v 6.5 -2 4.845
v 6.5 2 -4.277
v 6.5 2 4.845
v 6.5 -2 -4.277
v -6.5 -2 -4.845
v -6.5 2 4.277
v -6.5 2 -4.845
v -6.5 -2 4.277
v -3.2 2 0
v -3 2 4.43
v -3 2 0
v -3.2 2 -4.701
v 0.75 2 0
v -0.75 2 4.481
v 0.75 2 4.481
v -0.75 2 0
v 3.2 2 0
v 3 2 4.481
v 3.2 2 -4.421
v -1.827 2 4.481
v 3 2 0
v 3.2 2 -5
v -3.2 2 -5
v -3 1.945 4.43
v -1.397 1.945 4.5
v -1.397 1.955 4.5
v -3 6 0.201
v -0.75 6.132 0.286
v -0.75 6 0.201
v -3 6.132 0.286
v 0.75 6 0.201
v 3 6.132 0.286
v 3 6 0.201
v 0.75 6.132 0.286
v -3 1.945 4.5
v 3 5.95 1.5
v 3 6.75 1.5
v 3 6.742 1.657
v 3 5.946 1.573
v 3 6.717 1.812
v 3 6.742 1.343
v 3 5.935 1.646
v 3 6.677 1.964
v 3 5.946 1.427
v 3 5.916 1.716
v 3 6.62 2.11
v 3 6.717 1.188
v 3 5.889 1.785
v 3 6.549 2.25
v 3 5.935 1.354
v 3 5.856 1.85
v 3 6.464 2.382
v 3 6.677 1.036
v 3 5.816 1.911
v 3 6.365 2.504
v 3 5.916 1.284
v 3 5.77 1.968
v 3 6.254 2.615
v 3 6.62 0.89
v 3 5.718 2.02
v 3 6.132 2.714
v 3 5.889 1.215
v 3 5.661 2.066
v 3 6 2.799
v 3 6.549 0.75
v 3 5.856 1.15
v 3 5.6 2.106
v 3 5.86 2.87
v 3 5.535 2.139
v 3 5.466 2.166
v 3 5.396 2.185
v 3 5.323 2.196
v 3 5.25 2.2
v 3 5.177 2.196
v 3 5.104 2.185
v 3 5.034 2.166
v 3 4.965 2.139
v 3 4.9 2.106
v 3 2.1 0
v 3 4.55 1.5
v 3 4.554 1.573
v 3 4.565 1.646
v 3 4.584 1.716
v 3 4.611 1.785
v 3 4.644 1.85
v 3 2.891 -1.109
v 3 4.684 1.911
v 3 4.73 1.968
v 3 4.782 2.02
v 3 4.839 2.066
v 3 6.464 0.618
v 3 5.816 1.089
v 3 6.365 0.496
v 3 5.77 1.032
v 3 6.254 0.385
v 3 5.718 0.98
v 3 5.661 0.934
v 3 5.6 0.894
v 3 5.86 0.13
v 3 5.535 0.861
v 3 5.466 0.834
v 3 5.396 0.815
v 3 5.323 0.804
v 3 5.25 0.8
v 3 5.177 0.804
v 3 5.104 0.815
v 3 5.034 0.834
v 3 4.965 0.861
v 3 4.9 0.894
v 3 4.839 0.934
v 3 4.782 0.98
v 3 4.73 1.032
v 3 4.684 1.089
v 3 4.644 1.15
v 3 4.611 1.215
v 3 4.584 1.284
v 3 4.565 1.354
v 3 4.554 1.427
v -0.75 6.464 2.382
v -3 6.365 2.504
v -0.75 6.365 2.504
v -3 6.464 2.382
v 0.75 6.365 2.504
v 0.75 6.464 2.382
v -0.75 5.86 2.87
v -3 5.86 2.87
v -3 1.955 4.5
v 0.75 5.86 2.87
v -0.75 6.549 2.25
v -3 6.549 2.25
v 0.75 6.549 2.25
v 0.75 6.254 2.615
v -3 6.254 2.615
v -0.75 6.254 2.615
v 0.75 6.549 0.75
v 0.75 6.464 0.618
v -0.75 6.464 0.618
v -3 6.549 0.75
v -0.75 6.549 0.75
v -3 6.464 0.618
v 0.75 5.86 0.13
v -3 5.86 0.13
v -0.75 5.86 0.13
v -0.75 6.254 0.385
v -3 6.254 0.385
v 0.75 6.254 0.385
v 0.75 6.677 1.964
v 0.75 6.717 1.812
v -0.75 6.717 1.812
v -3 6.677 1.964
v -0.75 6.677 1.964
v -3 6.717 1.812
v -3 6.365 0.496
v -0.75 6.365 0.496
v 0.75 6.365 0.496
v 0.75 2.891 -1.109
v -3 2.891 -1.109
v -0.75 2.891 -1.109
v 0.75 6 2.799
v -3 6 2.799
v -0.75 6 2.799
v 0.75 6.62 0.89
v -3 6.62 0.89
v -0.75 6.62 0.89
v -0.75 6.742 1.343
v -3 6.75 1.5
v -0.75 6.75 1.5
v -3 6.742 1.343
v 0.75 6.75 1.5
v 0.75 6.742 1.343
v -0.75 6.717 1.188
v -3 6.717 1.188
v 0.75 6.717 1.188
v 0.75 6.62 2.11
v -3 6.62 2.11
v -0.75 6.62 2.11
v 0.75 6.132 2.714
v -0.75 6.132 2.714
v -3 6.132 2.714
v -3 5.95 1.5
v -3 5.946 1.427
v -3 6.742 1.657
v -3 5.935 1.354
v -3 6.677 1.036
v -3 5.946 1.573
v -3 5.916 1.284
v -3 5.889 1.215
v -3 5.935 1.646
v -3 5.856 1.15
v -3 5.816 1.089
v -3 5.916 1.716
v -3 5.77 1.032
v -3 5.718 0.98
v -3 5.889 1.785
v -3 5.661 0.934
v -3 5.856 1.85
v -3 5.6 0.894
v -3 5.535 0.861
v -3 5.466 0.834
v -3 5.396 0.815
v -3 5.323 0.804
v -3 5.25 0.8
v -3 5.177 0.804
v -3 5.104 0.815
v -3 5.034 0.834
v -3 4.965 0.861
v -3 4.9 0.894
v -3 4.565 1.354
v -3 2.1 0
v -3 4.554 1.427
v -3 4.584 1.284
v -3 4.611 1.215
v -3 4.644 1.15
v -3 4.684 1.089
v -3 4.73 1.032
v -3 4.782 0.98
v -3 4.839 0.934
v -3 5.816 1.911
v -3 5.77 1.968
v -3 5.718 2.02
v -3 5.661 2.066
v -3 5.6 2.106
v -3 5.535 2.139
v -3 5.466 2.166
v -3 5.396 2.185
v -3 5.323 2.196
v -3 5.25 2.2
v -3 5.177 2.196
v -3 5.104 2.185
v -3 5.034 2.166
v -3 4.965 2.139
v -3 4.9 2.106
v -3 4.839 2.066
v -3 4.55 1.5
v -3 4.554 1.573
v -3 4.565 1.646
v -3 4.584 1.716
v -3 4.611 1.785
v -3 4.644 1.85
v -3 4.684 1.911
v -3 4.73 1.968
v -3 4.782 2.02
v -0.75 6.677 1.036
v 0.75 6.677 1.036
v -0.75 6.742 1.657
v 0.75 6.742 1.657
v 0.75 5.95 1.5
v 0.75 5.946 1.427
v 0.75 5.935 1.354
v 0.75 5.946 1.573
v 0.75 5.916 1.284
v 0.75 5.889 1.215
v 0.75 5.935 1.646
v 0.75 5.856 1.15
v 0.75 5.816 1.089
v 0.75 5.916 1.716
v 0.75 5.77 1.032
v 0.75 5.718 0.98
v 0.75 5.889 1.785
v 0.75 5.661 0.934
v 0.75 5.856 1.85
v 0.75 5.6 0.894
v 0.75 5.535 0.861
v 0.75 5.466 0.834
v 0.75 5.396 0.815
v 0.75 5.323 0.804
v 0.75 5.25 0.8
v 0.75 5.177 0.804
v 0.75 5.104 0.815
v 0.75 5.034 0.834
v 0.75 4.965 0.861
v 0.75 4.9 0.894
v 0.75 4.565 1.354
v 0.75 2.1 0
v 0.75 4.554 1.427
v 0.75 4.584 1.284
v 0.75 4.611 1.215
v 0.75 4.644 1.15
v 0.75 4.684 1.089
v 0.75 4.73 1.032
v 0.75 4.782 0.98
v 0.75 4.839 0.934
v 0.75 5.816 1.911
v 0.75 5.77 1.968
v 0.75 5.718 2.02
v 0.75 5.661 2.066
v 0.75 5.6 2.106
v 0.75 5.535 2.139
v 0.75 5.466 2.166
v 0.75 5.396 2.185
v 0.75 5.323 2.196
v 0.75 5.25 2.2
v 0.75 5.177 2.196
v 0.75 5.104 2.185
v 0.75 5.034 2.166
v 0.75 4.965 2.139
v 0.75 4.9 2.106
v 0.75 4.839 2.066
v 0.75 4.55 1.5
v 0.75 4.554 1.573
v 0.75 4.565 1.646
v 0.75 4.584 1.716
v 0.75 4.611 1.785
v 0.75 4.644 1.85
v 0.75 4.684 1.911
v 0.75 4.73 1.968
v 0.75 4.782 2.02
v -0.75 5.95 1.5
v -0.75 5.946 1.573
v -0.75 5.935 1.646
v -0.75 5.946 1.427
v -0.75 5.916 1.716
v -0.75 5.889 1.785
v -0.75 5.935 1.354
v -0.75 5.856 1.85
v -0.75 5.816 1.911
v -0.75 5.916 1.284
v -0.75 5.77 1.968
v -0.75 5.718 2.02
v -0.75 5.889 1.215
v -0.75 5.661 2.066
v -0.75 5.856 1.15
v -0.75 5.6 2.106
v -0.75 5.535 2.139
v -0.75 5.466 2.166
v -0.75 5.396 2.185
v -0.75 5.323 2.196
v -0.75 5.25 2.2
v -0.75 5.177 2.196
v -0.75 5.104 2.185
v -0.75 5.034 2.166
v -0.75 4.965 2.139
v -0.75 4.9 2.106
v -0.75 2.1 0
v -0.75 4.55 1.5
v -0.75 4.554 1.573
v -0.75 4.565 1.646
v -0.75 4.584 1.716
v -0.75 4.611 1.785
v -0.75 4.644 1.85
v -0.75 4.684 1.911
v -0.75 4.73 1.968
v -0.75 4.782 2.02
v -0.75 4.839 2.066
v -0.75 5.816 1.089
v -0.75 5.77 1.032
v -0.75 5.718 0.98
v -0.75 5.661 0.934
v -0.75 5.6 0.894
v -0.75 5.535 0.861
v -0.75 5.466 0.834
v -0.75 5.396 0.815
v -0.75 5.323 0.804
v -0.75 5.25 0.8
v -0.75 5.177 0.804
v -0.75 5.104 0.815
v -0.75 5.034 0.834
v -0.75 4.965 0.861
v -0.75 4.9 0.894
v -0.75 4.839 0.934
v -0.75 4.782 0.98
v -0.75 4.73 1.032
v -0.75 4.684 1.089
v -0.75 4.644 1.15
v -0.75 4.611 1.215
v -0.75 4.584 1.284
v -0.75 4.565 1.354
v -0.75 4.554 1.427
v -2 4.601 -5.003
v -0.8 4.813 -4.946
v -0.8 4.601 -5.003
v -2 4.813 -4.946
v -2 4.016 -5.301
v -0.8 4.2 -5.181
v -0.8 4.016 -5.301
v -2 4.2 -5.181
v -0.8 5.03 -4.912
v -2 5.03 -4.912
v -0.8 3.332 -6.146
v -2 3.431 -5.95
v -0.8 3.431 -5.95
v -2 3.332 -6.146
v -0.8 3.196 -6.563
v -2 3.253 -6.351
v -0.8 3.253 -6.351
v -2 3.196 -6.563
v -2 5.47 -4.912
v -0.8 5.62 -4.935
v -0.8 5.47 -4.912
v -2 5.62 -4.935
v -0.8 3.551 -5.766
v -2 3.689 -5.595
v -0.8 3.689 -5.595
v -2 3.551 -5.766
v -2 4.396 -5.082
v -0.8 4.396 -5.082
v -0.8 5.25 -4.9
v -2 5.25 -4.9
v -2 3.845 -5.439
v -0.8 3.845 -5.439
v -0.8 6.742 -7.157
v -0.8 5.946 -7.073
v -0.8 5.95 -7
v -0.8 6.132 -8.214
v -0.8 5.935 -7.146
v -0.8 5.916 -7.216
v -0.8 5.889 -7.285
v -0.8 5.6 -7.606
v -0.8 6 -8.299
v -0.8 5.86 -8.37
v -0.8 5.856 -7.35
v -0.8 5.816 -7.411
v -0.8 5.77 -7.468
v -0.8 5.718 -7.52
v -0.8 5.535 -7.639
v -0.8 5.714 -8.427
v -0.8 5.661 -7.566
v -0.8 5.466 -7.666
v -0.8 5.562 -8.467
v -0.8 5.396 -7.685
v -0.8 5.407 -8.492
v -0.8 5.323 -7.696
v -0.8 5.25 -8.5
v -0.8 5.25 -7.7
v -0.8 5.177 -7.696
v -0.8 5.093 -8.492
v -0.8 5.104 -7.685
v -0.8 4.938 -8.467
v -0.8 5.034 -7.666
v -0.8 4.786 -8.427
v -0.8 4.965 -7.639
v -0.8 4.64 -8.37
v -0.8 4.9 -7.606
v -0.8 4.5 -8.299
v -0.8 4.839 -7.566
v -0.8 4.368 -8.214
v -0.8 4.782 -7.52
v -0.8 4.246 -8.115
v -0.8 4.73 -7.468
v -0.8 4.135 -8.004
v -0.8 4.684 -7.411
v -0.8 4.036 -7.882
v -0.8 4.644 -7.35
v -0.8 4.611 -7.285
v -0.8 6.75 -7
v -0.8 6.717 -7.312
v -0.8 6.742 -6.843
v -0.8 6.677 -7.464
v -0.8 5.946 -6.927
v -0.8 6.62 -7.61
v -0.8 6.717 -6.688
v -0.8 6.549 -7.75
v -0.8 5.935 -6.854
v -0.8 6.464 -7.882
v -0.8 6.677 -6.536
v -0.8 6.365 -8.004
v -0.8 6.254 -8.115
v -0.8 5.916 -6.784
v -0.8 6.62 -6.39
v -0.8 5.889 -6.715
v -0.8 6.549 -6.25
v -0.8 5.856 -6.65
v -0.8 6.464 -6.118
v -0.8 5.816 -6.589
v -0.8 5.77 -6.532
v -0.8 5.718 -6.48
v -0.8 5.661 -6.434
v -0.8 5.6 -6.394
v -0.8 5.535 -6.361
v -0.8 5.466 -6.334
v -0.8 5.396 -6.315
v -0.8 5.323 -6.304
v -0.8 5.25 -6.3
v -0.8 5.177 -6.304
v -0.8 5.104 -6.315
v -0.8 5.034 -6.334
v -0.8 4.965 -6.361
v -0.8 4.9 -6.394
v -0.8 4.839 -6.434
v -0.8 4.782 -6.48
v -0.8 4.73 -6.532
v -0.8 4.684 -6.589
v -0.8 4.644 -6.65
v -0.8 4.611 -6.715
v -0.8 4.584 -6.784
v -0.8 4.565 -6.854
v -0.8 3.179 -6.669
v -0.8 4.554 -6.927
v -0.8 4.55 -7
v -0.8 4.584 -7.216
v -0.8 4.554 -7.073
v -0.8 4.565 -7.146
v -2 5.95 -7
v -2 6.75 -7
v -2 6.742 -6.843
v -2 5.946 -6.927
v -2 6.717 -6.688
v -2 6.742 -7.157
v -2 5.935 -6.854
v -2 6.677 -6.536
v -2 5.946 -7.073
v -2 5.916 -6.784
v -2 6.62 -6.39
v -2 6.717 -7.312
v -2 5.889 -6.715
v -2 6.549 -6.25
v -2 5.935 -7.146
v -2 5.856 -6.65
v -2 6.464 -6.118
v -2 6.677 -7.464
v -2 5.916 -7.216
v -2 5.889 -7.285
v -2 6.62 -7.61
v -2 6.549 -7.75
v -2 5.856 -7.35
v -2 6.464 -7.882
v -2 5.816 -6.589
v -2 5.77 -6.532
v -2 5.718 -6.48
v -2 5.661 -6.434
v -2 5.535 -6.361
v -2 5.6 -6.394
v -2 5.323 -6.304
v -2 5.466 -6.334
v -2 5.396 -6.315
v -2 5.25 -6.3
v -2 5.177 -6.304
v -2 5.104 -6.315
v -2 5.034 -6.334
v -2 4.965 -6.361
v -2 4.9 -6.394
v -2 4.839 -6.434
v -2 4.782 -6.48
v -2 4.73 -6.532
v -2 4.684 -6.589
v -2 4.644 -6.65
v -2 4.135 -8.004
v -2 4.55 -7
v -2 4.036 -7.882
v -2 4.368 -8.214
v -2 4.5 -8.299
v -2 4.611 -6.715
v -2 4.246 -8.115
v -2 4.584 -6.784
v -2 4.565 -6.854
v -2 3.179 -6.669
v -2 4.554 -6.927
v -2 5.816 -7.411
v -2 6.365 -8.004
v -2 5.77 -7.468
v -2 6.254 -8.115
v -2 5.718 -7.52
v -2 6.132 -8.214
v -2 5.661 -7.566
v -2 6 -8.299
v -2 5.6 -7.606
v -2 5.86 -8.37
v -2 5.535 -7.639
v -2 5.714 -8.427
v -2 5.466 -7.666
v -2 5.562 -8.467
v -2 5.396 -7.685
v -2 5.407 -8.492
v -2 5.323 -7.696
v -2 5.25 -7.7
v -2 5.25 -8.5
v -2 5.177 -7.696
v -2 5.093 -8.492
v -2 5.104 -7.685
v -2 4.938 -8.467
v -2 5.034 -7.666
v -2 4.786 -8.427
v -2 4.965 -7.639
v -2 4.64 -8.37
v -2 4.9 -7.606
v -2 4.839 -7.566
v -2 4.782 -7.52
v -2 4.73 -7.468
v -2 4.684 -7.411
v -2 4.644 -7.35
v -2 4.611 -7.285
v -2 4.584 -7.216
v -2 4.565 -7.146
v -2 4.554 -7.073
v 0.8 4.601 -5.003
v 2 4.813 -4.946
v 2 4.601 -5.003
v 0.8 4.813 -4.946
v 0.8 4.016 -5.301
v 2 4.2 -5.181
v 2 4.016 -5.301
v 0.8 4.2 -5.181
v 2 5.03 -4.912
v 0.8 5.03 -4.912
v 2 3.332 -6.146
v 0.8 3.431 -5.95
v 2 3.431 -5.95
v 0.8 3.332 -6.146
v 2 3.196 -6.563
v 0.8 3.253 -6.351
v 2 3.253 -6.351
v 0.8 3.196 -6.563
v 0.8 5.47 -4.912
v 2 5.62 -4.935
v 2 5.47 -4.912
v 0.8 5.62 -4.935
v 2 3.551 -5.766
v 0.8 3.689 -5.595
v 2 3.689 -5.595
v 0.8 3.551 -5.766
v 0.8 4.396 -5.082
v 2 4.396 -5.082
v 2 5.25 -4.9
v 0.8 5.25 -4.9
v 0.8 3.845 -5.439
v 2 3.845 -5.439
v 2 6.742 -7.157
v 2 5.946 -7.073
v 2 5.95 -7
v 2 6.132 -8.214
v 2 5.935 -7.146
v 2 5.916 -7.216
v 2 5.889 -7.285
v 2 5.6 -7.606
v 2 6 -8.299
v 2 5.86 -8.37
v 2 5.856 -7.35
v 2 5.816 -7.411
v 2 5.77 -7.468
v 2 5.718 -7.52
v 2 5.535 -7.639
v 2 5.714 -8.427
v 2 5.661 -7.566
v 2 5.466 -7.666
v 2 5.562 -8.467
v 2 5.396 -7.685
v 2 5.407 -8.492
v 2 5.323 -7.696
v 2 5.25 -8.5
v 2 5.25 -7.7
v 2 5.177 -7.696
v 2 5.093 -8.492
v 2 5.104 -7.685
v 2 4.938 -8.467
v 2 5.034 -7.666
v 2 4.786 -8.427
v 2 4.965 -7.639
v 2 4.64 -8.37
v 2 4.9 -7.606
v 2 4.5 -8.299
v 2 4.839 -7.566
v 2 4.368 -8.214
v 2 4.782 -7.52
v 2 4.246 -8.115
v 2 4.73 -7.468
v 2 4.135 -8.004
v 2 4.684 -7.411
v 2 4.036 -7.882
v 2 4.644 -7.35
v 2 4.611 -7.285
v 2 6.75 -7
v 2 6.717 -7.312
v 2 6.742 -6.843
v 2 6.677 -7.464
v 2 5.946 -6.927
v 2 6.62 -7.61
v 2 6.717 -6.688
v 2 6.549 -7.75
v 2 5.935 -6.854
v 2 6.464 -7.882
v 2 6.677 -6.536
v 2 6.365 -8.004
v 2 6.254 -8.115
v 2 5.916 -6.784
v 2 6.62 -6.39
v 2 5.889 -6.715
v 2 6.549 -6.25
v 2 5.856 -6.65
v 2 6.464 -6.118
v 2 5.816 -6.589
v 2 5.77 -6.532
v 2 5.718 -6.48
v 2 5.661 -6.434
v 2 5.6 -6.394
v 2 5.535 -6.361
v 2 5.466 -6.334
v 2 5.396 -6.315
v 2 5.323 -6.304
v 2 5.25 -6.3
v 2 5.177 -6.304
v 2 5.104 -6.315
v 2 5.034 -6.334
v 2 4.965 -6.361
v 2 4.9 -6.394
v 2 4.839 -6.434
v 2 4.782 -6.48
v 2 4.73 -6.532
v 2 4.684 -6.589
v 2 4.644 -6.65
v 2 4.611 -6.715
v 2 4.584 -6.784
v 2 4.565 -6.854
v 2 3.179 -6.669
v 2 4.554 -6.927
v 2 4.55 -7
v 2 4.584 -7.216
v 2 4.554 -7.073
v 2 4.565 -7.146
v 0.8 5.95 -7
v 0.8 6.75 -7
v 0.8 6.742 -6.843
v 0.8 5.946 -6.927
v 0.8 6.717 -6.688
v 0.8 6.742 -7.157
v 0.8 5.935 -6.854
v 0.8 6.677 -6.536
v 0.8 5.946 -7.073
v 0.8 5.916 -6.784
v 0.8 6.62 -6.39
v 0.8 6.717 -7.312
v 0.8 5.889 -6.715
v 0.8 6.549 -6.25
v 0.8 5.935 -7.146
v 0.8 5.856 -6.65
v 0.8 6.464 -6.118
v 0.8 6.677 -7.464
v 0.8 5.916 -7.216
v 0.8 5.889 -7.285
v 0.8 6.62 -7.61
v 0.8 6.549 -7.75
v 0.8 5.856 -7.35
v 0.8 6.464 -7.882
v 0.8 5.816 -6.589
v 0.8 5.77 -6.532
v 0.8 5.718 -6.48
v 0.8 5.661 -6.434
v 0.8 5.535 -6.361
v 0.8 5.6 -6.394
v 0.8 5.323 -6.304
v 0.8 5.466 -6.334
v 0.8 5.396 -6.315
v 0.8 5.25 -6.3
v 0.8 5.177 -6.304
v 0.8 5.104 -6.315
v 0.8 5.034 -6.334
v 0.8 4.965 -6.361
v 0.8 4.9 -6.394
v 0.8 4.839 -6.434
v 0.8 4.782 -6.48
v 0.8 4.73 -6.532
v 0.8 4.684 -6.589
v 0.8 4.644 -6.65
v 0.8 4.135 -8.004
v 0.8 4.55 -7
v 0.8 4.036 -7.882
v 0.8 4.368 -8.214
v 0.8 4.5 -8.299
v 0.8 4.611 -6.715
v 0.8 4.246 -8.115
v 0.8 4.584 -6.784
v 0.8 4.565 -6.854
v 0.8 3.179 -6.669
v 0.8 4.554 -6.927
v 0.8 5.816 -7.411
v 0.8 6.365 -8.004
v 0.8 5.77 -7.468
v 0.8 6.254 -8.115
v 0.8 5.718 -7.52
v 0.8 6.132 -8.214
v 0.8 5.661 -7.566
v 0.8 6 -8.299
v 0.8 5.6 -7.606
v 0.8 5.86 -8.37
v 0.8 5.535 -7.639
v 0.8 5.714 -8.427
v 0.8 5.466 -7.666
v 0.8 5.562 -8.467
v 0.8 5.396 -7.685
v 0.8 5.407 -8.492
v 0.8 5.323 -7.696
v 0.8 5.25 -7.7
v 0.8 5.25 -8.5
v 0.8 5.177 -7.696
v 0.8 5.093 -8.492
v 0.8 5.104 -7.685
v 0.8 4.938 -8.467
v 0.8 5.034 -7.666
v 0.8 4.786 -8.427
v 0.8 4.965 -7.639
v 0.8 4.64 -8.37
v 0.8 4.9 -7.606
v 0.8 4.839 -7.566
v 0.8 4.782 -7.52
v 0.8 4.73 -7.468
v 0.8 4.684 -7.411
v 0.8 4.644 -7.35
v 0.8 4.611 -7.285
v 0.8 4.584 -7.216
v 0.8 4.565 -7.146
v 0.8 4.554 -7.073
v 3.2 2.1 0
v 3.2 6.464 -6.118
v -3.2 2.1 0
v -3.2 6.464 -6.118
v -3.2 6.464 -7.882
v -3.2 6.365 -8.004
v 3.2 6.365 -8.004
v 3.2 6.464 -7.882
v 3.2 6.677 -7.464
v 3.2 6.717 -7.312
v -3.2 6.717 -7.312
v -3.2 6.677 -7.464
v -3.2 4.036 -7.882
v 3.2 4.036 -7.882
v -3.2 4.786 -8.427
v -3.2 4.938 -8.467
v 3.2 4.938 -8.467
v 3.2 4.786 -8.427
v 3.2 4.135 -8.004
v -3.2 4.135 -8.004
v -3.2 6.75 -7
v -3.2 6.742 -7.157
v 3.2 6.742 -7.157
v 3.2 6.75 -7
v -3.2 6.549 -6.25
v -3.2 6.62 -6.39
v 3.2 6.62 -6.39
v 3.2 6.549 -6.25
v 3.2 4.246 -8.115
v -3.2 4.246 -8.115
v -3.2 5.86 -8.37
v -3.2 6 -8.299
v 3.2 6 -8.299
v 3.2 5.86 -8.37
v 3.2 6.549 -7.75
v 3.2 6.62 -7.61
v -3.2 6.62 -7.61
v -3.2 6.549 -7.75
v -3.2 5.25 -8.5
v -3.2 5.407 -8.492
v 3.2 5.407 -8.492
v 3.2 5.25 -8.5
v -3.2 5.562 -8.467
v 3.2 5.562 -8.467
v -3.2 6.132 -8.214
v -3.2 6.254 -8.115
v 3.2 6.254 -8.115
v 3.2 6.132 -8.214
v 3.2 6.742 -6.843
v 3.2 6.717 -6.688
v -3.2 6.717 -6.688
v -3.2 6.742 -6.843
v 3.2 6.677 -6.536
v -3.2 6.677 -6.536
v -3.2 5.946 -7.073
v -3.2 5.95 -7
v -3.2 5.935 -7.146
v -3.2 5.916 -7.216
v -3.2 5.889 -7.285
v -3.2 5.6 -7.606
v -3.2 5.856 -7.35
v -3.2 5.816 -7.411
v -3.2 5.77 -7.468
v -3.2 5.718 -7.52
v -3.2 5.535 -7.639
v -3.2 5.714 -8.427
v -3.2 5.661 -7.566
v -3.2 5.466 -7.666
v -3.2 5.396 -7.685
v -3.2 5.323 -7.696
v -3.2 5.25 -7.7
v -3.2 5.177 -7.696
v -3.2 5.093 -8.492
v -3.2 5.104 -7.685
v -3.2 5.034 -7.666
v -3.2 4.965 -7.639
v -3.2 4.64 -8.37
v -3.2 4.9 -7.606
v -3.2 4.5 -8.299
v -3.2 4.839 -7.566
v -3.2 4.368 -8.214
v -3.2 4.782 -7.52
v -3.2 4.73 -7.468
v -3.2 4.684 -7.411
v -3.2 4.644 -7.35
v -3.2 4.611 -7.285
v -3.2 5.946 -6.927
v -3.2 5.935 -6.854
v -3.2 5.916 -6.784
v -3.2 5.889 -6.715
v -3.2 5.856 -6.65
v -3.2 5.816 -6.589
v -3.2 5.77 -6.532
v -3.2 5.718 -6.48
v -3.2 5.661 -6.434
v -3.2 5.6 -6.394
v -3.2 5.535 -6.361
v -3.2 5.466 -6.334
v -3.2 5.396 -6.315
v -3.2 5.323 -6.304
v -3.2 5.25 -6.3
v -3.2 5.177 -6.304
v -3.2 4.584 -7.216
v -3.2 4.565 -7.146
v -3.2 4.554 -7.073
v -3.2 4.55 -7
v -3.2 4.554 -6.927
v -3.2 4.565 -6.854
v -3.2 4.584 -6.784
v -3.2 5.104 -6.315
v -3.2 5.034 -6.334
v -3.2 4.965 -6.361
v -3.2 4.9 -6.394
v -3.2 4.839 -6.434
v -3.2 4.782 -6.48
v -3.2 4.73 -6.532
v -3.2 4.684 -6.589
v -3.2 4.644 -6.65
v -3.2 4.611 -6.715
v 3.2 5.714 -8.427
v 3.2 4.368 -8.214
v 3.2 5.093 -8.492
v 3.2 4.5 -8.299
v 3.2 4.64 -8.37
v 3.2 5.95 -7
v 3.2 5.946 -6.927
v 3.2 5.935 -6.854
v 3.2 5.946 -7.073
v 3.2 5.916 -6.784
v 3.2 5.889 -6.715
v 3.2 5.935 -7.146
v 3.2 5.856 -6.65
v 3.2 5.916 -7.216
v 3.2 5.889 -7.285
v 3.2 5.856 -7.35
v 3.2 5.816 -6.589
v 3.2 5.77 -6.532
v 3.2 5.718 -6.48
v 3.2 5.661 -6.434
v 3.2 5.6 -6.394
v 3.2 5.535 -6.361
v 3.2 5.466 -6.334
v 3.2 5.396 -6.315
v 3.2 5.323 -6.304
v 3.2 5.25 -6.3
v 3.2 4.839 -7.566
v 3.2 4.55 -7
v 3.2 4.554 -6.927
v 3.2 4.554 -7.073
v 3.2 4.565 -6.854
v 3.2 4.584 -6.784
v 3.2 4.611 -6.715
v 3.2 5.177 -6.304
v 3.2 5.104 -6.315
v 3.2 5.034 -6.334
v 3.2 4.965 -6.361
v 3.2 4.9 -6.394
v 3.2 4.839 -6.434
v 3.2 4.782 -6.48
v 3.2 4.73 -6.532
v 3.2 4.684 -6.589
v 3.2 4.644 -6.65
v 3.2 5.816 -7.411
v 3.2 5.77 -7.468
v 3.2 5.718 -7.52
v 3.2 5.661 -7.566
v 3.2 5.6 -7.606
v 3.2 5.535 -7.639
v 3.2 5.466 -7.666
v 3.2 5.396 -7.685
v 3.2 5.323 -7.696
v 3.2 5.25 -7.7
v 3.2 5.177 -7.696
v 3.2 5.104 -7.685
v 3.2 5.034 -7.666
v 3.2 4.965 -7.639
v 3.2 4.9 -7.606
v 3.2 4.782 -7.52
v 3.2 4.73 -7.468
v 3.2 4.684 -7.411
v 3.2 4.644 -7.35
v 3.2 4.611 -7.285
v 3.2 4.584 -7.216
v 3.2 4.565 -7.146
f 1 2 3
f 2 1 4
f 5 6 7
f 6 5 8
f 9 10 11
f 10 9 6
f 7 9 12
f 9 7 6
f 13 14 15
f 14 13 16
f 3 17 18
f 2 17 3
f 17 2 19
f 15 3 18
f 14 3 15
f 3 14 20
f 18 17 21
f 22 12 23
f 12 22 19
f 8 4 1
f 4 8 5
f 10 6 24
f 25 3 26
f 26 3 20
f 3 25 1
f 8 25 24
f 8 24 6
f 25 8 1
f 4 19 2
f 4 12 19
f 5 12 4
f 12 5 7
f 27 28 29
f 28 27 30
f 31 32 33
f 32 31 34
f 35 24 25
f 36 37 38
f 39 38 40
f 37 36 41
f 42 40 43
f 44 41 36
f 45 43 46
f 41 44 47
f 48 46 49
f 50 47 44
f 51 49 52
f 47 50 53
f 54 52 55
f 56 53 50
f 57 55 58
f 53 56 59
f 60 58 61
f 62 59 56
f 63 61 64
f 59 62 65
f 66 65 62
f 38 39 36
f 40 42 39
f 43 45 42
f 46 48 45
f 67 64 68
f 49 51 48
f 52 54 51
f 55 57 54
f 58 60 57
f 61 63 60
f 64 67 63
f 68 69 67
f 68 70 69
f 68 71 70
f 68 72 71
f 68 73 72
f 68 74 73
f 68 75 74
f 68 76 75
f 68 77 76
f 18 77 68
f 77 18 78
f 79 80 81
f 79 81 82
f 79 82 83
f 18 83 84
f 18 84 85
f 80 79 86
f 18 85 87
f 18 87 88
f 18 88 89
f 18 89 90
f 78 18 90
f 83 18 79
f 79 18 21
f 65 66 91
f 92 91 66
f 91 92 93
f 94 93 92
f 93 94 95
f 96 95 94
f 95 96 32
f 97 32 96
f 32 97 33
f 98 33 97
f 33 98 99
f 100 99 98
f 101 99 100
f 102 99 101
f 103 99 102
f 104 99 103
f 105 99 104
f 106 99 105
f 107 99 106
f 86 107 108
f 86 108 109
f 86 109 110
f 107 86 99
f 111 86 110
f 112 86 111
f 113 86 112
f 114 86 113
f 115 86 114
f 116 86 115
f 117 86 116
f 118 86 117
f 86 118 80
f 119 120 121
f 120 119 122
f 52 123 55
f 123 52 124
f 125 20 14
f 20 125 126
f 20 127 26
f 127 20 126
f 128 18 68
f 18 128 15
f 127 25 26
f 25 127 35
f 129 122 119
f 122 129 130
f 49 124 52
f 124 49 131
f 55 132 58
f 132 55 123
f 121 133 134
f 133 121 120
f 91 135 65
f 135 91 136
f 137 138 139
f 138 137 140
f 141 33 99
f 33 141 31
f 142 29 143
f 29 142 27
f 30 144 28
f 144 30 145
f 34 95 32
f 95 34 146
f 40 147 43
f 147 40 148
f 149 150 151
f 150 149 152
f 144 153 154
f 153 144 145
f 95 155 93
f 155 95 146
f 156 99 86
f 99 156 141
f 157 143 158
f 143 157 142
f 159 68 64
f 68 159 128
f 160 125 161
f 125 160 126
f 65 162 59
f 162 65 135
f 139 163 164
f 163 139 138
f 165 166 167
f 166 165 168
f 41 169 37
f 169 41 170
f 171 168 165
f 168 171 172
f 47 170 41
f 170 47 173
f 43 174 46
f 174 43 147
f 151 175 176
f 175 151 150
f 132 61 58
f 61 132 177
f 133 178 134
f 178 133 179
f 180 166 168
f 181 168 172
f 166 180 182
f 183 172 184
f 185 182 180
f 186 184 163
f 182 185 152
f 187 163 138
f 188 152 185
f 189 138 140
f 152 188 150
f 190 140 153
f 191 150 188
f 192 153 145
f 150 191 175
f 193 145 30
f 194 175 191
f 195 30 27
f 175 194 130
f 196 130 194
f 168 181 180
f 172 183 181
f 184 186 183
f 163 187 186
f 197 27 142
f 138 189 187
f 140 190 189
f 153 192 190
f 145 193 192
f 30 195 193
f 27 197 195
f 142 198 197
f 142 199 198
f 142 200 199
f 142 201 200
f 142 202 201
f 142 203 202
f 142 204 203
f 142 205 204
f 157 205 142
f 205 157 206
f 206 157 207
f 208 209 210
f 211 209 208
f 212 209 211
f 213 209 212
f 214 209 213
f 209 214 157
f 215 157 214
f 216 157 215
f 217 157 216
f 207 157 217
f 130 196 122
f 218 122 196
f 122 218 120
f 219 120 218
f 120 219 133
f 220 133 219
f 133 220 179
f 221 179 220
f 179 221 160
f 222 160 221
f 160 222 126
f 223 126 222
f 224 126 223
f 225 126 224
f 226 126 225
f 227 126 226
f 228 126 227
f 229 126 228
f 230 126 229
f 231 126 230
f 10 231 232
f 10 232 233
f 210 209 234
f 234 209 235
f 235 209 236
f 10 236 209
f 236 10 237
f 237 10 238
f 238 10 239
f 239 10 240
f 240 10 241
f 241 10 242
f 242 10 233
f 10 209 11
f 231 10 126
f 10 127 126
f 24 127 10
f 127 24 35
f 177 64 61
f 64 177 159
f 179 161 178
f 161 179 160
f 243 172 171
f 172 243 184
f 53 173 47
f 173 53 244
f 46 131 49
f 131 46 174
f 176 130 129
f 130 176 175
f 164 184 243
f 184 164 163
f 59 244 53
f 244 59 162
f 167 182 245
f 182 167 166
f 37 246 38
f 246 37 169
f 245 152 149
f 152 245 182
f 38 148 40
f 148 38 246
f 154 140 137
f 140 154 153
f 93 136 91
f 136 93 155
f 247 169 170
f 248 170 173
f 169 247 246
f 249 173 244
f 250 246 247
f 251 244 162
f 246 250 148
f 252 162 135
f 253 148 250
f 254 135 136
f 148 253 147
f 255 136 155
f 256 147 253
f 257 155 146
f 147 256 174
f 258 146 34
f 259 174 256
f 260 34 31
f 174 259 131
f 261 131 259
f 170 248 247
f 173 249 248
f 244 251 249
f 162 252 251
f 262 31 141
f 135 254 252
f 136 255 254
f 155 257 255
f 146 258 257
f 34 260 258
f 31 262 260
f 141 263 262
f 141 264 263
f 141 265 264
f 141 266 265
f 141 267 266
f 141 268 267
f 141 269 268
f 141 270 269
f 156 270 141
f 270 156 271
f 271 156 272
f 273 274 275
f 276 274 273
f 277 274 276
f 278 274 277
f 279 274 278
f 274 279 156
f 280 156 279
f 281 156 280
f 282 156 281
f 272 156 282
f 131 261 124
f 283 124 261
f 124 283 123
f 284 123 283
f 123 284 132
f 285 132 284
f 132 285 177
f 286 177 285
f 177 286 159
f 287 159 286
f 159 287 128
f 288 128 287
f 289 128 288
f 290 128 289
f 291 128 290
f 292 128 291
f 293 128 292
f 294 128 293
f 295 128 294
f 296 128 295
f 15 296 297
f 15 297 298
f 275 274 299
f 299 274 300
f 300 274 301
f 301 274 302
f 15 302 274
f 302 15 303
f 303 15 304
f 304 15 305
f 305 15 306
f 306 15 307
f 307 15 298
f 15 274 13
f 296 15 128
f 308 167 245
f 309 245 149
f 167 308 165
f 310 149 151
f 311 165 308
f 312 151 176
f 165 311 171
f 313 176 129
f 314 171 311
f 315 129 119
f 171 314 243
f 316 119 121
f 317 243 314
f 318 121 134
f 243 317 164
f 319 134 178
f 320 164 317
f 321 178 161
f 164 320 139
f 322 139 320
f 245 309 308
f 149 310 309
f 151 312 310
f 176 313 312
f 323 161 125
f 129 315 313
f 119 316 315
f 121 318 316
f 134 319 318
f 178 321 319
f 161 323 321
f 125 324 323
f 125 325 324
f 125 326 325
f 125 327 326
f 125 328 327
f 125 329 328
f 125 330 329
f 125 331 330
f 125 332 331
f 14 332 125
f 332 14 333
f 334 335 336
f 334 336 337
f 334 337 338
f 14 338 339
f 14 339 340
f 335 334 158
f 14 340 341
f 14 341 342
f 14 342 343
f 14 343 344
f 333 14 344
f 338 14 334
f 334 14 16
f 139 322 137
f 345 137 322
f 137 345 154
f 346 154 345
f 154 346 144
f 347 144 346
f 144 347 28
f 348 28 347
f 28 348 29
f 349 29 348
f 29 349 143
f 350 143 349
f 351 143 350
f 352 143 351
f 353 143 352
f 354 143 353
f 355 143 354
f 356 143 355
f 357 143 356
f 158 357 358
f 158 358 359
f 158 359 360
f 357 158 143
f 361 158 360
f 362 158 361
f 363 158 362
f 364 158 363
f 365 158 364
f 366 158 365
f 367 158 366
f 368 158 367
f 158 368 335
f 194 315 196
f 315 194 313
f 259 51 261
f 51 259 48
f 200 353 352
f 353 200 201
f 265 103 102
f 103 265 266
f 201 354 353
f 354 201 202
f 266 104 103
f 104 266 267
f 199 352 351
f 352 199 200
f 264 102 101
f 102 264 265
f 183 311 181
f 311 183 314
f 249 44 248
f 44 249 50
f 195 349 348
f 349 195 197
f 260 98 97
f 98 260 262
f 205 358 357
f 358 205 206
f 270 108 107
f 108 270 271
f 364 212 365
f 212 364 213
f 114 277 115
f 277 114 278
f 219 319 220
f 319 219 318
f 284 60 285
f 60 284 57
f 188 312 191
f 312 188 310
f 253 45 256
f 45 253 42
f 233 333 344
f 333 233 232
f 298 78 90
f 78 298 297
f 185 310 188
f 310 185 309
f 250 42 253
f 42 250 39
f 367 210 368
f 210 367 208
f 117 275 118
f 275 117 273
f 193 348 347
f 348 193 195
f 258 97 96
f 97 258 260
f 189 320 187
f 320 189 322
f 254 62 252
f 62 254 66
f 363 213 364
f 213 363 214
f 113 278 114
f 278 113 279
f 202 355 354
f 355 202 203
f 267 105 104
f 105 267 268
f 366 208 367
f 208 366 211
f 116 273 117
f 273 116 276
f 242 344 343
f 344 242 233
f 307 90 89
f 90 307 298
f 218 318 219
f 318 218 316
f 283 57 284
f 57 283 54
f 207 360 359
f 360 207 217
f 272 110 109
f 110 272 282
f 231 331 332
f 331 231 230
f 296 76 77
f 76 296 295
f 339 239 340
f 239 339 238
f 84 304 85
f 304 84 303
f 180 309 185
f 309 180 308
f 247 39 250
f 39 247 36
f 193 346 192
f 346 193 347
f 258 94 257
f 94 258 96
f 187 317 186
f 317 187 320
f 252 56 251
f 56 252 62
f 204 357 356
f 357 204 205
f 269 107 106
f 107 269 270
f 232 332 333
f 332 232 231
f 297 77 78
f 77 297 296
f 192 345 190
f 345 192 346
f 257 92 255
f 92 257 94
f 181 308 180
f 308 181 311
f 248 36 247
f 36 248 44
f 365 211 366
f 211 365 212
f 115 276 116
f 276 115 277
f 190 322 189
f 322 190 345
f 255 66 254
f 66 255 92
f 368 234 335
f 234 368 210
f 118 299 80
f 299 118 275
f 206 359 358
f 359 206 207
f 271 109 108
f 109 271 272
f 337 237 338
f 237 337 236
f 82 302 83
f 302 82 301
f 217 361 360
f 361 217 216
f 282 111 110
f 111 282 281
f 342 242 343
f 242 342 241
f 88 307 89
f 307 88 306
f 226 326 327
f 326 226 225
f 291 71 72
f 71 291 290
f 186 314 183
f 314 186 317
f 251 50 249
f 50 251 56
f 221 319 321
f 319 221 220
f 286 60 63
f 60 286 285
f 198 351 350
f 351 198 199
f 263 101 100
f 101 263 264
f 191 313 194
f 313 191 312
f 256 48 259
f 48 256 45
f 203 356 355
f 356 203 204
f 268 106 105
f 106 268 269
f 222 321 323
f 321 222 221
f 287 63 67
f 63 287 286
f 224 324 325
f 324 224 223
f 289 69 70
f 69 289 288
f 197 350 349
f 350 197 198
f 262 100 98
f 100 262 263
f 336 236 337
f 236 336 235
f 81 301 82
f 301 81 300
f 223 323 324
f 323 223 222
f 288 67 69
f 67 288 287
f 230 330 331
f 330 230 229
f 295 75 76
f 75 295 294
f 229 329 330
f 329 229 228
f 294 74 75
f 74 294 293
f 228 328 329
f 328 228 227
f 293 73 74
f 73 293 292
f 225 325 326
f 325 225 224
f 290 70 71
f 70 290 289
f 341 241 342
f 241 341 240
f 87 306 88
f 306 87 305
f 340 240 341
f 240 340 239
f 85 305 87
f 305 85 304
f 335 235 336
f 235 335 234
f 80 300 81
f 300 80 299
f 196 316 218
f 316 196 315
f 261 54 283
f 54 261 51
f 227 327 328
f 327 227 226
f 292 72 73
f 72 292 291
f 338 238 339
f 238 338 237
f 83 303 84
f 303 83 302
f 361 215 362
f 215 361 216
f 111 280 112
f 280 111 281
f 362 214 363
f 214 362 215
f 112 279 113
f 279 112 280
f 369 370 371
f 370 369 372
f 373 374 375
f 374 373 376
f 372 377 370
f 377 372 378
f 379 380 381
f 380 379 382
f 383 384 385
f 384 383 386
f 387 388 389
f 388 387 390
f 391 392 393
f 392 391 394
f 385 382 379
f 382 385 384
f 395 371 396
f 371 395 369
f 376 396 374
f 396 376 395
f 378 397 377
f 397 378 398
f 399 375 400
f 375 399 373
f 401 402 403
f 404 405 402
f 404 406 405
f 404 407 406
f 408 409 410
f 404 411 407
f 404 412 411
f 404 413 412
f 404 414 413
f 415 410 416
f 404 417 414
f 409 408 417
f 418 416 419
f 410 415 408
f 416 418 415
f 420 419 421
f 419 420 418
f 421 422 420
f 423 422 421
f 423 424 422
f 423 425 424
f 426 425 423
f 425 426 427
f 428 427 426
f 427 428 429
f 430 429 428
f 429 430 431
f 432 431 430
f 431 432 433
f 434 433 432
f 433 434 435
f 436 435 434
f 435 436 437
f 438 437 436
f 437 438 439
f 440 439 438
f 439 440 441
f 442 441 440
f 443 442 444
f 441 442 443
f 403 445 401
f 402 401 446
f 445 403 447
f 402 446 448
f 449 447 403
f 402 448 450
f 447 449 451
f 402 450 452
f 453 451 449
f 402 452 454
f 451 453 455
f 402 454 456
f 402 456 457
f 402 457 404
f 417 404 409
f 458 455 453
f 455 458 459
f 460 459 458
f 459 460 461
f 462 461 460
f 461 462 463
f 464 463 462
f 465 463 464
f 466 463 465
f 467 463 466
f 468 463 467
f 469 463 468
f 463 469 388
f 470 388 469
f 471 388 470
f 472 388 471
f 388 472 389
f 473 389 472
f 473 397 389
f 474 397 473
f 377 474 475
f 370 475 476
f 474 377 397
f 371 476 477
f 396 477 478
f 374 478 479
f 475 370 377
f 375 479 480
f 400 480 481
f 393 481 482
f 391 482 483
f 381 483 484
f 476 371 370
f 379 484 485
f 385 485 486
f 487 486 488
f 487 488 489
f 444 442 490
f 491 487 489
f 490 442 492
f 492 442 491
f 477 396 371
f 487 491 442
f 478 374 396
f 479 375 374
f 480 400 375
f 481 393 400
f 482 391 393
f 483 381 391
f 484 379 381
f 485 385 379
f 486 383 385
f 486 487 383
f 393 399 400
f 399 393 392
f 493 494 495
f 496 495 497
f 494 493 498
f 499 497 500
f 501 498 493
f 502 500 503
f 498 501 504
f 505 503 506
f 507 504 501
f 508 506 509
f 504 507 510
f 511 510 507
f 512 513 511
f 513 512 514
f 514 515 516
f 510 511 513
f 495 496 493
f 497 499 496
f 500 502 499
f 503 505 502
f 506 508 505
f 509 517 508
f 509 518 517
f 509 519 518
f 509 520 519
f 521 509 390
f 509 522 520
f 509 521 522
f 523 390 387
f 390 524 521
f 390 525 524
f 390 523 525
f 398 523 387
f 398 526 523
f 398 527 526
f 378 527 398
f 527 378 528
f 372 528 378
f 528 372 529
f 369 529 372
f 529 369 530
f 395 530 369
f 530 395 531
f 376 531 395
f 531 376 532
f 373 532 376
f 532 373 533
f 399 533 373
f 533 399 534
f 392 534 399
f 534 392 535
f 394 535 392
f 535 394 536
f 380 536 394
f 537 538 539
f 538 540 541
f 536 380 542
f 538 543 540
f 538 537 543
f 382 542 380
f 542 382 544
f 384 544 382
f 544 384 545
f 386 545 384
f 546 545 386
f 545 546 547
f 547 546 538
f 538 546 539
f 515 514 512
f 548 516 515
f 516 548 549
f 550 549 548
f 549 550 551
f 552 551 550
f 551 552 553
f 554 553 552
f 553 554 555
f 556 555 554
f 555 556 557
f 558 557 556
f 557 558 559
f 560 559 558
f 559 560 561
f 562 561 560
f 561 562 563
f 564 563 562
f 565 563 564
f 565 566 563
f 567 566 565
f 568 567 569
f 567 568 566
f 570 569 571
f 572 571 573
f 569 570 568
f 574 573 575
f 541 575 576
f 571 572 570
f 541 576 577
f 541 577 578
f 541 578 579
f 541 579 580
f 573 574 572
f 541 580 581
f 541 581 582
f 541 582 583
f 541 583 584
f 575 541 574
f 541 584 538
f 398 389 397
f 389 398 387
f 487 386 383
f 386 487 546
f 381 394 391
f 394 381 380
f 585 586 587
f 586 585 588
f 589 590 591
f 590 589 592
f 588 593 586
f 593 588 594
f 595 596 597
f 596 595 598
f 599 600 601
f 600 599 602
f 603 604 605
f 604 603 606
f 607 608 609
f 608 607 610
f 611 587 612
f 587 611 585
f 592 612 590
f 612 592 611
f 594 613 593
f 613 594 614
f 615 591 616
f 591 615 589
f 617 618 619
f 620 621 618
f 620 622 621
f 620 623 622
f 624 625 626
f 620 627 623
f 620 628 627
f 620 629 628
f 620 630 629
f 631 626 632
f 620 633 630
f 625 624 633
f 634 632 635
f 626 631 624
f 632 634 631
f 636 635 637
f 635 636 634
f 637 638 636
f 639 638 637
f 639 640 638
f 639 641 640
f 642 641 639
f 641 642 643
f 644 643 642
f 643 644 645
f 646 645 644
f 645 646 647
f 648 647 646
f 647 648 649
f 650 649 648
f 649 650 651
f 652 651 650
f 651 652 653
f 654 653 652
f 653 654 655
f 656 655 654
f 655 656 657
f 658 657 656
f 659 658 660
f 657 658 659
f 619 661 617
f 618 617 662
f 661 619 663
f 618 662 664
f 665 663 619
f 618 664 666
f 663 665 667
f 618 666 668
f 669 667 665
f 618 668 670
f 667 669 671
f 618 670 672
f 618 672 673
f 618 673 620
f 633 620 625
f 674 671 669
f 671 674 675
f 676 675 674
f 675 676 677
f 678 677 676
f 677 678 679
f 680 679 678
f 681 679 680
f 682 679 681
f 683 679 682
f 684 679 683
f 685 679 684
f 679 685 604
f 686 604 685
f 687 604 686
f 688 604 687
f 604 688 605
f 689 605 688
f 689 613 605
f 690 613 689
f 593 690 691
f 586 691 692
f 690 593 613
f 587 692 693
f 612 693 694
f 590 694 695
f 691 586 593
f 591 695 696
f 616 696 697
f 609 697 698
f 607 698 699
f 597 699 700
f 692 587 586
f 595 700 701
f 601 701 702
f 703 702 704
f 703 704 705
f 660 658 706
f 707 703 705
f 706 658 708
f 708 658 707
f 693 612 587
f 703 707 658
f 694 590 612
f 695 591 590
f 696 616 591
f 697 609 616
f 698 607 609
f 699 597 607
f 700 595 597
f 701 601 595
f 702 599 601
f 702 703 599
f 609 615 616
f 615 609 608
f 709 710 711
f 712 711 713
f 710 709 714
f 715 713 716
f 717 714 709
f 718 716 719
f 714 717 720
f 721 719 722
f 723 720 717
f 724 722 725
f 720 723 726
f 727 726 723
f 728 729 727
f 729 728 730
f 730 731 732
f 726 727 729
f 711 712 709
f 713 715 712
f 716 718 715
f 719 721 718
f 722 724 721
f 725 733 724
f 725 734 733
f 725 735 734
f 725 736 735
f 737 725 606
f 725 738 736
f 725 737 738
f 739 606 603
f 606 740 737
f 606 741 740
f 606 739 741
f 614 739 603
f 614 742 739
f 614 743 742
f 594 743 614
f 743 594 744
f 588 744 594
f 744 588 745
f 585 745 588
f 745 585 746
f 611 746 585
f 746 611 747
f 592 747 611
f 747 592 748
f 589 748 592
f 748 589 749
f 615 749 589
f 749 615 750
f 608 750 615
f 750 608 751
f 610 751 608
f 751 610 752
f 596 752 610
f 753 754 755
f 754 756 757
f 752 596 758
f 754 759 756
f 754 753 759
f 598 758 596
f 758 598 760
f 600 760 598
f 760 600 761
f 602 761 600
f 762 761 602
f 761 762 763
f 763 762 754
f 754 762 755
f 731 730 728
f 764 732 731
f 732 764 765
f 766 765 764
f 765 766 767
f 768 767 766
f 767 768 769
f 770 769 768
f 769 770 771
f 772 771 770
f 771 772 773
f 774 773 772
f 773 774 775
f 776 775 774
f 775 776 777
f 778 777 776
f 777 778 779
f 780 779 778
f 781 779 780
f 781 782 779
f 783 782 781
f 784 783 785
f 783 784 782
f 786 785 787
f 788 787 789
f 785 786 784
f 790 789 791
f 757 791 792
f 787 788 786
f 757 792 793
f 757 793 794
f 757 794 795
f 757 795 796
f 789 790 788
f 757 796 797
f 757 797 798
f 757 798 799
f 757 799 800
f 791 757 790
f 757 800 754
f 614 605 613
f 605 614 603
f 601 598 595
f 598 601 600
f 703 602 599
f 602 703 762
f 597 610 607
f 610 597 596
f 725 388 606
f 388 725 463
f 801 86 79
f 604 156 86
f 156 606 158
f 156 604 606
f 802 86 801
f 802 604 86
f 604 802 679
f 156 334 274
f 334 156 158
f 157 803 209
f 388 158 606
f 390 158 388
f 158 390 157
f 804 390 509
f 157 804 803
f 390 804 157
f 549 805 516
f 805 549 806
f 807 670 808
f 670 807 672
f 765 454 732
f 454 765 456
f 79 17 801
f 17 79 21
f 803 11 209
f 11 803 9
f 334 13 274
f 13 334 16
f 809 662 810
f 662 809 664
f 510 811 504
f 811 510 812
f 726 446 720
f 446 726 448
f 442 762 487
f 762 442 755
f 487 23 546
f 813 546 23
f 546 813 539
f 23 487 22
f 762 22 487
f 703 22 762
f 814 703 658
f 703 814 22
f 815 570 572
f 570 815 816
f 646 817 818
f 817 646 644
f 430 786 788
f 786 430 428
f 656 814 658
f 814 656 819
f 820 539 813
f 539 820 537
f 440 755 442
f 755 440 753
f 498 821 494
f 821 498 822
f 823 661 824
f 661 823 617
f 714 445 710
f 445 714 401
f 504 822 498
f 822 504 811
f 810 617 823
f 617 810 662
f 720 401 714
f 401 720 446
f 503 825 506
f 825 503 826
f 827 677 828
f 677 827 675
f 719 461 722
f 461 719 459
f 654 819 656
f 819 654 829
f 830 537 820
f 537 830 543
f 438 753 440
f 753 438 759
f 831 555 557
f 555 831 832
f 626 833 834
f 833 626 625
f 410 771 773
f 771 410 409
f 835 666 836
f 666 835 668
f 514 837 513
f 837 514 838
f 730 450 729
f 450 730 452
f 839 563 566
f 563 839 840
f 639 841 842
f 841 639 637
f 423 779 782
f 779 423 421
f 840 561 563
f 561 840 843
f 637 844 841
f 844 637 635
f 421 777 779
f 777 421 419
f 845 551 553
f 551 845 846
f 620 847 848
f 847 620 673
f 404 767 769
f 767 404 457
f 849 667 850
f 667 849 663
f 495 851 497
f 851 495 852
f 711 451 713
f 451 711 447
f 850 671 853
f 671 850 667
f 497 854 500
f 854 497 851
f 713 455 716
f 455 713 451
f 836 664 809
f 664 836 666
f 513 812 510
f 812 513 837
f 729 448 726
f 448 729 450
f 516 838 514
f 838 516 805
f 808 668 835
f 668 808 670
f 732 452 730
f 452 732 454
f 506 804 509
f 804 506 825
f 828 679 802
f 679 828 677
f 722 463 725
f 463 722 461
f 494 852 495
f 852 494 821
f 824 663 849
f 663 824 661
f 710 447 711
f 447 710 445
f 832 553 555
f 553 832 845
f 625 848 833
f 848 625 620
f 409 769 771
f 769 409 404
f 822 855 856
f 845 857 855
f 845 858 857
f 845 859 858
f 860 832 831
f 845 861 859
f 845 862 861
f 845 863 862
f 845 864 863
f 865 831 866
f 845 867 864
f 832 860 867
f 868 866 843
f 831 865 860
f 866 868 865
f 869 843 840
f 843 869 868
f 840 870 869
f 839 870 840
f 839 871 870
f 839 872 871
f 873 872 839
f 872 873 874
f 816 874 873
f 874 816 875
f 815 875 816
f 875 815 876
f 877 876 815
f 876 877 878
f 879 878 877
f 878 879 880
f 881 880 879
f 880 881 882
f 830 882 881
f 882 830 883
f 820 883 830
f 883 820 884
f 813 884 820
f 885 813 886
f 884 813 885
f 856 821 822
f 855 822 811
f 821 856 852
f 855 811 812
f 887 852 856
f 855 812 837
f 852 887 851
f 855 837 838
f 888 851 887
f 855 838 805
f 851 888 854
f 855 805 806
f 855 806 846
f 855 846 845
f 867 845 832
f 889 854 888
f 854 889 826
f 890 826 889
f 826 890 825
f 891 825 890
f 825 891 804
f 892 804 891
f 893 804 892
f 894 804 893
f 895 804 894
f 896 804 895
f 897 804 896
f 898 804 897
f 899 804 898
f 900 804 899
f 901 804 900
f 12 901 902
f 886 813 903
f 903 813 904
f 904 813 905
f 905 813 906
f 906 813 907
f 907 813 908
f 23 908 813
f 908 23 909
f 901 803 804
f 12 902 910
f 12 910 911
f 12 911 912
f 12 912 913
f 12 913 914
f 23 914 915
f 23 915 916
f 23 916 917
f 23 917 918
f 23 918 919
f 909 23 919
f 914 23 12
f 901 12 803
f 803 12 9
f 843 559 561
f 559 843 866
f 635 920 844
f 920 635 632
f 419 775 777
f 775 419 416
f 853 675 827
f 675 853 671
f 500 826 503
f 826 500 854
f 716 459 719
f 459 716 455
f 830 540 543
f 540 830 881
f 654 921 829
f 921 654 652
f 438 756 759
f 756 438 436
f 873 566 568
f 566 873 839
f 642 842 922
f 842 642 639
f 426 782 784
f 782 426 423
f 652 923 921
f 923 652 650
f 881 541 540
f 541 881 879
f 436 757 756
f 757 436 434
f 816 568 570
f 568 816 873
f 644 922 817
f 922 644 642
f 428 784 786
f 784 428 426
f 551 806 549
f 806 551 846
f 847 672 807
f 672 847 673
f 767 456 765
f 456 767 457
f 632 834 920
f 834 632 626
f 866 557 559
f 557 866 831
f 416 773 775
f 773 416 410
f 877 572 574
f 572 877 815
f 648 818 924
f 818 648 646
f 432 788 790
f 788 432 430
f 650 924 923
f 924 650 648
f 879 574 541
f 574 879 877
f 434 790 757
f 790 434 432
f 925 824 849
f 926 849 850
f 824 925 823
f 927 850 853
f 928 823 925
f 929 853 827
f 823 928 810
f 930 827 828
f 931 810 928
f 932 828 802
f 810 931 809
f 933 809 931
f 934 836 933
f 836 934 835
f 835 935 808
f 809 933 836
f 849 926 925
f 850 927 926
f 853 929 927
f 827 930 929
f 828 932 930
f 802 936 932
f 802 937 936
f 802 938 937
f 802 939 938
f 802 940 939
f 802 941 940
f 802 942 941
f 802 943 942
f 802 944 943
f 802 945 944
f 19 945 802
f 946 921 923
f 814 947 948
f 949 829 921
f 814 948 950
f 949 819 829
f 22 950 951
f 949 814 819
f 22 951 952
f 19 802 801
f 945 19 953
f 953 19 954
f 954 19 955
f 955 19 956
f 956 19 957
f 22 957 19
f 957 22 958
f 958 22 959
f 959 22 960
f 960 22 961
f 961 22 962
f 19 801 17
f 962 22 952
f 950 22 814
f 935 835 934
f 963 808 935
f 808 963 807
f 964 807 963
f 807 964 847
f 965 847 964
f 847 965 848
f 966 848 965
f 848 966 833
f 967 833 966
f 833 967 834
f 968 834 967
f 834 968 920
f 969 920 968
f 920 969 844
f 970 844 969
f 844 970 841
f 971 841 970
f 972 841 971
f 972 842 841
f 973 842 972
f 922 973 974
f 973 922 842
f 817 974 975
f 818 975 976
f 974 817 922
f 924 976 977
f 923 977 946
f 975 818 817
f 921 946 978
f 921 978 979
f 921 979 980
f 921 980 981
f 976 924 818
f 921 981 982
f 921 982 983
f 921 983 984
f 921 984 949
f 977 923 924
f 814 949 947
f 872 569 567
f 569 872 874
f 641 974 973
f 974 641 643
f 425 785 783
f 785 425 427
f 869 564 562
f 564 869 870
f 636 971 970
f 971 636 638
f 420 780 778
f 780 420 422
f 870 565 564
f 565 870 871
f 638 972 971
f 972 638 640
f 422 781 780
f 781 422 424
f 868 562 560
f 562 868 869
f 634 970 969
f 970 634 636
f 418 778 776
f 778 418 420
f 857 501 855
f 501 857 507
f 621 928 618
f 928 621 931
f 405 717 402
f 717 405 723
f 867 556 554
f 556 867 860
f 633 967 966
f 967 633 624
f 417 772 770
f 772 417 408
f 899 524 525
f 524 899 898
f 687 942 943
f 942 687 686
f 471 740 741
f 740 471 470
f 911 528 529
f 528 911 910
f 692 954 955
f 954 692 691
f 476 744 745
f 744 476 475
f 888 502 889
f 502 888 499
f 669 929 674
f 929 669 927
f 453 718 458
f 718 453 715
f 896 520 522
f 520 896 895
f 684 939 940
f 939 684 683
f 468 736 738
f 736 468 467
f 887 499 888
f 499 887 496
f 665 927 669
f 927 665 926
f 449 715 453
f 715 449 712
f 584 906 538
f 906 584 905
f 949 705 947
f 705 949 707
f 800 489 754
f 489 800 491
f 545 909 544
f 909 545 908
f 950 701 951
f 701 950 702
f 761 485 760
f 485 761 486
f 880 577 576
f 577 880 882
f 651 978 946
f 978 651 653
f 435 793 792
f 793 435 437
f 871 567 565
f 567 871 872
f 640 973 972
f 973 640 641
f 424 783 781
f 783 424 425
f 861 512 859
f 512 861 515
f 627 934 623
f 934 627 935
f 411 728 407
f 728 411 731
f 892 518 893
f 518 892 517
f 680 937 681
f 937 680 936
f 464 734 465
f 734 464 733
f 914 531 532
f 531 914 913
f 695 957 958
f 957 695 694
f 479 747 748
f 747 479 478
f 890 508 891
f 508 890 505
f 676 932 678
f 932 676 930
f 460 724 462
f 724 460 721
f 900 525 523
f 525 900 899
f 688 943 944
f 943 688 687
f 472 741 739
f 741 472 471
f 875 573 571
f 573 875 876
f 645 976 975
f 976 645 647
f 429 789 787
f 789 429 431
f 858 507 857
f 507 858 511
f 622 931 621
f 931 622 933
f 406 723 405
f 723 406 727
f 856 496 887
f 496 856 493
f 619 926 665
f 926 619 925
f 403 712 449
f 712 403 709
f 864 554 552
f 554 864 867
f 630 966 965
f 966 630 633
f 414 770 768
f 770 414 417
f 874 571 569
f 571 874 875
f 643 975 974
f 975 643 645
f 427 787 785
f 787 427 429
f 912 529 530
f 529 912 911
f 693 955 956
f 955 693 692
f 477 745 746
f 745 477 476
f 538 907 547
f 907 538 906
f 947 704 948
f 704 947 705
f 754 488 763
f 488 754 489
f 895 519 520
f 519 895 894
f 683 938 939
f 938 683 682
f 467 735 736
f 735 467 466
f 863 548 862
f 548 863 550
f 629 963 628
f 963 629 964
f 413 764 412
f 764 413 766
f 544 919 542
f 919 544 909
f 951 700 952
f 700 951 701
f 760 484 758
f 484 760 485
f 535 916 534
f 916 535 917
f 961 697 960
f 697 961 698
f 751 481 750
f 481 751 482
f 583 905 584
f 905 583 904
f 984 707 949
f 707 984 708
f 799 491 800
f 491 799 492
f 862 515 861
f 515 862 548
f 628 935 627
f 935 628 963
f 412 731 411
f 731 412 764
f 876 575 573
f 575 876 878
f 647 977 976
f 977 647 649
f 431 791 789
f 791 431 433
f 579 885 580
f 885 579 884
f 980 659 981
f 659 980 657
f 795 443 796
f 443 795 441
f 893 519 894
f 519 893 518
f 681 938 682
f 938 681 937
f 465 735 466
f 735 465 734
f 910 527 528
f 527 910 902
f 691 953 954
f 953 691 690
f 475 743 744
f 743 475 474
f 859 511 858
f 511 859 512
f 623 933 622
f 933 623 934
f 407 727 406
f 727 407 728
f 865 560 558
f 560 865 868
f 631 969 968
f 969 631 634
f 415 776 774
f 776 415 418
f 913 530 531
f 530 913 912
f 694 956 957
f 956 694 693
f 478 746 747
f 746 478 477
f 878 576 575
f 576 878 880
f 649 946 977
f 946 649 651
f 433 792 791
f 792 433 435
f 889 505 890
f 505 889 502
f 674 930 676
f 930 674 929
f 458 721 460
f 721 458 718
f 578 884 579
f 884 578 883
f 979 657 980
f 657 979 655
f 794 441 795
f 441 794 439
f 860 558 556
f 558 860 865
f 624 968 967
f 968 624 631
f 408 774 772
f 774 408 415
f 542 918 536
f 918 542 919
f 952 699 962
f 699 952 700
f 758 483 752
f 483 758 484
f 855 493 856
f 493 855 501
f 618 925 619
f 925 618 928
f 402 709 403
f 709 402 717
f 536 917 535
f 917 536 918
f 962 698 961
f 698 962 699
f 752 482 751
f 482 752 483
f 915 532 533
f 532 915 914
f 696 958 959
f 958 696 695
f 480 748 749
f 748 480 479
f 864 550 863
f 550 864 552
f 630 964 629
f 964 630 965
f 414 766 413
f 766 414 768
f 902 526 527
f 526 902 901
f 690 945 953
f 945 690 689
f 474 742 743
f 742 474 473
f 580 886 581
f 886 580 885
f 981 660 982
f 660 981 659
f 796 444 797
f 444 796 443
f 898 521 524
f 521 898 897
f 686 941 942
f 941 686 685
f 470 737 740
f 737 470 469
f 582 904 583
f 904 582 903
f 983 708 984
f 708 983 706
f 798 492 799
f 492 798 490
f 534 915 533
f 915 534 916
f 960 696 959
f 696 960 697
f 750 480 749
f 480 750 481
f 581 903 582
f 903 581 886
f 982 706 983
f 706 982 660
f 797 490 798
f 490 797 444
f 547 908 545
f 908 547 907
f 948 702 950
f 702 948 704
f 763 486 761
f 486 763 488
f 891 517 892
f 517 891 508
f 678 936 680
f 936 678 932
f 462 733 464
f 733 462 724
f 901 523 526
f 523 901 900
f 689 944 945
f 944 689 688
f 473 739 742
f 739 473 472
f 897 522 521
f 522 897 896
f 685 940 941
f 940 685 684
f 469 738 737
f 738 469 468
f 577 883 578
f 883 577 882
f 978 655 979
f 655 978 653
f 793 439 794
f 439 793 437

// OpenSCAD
length=10;
side=-1;
angle=2.5*side;
difference(){
    cube([13,4,length], center=true);
    translate([-10*side,0,2.5+length/2]) rotate([0,angle,0]) 
        translate([10*side,0,0]) cube([20,5,5], center=true);
    translate([10*side,0,2.5-length]) rotate([0,angle,0]) 
        translate([-10*side,0,0]) cube([20,5,5], center=true);
}
translate([0,2+1.5+1.75,length/2-1.5-2]) rotate([0,90,0]) 
    difference(){
        hull(){
            cylinder(d=3, h=6, center=true, $fn=60);
            translate([0,-3.3,0]) cube([6,.01,6], center=true);
        }
        cube([6,6.5,1.5], center=true);
        cylinder(d=1.4, h=8, center=true, $fn=60);
    }
translate([0,2+1.5+1.75,-length/2]) rotate([0,90,0]) 
    difference(){
        hull(){
            translate([2,0,0]) cylinder(d=3, h=6.4, center=true, $fn=60);
            translate([-2.5,-3.2,0]) cube([5,.1,6.4], center=true);
        }
        translate([2,0,0]) cylinder(d=1.4, h=8, center=true, $fn=60);
        for(X=[-1,1]) translate([2,0,1.4*X]) 
            cylinder(d=4.2, h=1.2, center=true, $fn=60);
    }
